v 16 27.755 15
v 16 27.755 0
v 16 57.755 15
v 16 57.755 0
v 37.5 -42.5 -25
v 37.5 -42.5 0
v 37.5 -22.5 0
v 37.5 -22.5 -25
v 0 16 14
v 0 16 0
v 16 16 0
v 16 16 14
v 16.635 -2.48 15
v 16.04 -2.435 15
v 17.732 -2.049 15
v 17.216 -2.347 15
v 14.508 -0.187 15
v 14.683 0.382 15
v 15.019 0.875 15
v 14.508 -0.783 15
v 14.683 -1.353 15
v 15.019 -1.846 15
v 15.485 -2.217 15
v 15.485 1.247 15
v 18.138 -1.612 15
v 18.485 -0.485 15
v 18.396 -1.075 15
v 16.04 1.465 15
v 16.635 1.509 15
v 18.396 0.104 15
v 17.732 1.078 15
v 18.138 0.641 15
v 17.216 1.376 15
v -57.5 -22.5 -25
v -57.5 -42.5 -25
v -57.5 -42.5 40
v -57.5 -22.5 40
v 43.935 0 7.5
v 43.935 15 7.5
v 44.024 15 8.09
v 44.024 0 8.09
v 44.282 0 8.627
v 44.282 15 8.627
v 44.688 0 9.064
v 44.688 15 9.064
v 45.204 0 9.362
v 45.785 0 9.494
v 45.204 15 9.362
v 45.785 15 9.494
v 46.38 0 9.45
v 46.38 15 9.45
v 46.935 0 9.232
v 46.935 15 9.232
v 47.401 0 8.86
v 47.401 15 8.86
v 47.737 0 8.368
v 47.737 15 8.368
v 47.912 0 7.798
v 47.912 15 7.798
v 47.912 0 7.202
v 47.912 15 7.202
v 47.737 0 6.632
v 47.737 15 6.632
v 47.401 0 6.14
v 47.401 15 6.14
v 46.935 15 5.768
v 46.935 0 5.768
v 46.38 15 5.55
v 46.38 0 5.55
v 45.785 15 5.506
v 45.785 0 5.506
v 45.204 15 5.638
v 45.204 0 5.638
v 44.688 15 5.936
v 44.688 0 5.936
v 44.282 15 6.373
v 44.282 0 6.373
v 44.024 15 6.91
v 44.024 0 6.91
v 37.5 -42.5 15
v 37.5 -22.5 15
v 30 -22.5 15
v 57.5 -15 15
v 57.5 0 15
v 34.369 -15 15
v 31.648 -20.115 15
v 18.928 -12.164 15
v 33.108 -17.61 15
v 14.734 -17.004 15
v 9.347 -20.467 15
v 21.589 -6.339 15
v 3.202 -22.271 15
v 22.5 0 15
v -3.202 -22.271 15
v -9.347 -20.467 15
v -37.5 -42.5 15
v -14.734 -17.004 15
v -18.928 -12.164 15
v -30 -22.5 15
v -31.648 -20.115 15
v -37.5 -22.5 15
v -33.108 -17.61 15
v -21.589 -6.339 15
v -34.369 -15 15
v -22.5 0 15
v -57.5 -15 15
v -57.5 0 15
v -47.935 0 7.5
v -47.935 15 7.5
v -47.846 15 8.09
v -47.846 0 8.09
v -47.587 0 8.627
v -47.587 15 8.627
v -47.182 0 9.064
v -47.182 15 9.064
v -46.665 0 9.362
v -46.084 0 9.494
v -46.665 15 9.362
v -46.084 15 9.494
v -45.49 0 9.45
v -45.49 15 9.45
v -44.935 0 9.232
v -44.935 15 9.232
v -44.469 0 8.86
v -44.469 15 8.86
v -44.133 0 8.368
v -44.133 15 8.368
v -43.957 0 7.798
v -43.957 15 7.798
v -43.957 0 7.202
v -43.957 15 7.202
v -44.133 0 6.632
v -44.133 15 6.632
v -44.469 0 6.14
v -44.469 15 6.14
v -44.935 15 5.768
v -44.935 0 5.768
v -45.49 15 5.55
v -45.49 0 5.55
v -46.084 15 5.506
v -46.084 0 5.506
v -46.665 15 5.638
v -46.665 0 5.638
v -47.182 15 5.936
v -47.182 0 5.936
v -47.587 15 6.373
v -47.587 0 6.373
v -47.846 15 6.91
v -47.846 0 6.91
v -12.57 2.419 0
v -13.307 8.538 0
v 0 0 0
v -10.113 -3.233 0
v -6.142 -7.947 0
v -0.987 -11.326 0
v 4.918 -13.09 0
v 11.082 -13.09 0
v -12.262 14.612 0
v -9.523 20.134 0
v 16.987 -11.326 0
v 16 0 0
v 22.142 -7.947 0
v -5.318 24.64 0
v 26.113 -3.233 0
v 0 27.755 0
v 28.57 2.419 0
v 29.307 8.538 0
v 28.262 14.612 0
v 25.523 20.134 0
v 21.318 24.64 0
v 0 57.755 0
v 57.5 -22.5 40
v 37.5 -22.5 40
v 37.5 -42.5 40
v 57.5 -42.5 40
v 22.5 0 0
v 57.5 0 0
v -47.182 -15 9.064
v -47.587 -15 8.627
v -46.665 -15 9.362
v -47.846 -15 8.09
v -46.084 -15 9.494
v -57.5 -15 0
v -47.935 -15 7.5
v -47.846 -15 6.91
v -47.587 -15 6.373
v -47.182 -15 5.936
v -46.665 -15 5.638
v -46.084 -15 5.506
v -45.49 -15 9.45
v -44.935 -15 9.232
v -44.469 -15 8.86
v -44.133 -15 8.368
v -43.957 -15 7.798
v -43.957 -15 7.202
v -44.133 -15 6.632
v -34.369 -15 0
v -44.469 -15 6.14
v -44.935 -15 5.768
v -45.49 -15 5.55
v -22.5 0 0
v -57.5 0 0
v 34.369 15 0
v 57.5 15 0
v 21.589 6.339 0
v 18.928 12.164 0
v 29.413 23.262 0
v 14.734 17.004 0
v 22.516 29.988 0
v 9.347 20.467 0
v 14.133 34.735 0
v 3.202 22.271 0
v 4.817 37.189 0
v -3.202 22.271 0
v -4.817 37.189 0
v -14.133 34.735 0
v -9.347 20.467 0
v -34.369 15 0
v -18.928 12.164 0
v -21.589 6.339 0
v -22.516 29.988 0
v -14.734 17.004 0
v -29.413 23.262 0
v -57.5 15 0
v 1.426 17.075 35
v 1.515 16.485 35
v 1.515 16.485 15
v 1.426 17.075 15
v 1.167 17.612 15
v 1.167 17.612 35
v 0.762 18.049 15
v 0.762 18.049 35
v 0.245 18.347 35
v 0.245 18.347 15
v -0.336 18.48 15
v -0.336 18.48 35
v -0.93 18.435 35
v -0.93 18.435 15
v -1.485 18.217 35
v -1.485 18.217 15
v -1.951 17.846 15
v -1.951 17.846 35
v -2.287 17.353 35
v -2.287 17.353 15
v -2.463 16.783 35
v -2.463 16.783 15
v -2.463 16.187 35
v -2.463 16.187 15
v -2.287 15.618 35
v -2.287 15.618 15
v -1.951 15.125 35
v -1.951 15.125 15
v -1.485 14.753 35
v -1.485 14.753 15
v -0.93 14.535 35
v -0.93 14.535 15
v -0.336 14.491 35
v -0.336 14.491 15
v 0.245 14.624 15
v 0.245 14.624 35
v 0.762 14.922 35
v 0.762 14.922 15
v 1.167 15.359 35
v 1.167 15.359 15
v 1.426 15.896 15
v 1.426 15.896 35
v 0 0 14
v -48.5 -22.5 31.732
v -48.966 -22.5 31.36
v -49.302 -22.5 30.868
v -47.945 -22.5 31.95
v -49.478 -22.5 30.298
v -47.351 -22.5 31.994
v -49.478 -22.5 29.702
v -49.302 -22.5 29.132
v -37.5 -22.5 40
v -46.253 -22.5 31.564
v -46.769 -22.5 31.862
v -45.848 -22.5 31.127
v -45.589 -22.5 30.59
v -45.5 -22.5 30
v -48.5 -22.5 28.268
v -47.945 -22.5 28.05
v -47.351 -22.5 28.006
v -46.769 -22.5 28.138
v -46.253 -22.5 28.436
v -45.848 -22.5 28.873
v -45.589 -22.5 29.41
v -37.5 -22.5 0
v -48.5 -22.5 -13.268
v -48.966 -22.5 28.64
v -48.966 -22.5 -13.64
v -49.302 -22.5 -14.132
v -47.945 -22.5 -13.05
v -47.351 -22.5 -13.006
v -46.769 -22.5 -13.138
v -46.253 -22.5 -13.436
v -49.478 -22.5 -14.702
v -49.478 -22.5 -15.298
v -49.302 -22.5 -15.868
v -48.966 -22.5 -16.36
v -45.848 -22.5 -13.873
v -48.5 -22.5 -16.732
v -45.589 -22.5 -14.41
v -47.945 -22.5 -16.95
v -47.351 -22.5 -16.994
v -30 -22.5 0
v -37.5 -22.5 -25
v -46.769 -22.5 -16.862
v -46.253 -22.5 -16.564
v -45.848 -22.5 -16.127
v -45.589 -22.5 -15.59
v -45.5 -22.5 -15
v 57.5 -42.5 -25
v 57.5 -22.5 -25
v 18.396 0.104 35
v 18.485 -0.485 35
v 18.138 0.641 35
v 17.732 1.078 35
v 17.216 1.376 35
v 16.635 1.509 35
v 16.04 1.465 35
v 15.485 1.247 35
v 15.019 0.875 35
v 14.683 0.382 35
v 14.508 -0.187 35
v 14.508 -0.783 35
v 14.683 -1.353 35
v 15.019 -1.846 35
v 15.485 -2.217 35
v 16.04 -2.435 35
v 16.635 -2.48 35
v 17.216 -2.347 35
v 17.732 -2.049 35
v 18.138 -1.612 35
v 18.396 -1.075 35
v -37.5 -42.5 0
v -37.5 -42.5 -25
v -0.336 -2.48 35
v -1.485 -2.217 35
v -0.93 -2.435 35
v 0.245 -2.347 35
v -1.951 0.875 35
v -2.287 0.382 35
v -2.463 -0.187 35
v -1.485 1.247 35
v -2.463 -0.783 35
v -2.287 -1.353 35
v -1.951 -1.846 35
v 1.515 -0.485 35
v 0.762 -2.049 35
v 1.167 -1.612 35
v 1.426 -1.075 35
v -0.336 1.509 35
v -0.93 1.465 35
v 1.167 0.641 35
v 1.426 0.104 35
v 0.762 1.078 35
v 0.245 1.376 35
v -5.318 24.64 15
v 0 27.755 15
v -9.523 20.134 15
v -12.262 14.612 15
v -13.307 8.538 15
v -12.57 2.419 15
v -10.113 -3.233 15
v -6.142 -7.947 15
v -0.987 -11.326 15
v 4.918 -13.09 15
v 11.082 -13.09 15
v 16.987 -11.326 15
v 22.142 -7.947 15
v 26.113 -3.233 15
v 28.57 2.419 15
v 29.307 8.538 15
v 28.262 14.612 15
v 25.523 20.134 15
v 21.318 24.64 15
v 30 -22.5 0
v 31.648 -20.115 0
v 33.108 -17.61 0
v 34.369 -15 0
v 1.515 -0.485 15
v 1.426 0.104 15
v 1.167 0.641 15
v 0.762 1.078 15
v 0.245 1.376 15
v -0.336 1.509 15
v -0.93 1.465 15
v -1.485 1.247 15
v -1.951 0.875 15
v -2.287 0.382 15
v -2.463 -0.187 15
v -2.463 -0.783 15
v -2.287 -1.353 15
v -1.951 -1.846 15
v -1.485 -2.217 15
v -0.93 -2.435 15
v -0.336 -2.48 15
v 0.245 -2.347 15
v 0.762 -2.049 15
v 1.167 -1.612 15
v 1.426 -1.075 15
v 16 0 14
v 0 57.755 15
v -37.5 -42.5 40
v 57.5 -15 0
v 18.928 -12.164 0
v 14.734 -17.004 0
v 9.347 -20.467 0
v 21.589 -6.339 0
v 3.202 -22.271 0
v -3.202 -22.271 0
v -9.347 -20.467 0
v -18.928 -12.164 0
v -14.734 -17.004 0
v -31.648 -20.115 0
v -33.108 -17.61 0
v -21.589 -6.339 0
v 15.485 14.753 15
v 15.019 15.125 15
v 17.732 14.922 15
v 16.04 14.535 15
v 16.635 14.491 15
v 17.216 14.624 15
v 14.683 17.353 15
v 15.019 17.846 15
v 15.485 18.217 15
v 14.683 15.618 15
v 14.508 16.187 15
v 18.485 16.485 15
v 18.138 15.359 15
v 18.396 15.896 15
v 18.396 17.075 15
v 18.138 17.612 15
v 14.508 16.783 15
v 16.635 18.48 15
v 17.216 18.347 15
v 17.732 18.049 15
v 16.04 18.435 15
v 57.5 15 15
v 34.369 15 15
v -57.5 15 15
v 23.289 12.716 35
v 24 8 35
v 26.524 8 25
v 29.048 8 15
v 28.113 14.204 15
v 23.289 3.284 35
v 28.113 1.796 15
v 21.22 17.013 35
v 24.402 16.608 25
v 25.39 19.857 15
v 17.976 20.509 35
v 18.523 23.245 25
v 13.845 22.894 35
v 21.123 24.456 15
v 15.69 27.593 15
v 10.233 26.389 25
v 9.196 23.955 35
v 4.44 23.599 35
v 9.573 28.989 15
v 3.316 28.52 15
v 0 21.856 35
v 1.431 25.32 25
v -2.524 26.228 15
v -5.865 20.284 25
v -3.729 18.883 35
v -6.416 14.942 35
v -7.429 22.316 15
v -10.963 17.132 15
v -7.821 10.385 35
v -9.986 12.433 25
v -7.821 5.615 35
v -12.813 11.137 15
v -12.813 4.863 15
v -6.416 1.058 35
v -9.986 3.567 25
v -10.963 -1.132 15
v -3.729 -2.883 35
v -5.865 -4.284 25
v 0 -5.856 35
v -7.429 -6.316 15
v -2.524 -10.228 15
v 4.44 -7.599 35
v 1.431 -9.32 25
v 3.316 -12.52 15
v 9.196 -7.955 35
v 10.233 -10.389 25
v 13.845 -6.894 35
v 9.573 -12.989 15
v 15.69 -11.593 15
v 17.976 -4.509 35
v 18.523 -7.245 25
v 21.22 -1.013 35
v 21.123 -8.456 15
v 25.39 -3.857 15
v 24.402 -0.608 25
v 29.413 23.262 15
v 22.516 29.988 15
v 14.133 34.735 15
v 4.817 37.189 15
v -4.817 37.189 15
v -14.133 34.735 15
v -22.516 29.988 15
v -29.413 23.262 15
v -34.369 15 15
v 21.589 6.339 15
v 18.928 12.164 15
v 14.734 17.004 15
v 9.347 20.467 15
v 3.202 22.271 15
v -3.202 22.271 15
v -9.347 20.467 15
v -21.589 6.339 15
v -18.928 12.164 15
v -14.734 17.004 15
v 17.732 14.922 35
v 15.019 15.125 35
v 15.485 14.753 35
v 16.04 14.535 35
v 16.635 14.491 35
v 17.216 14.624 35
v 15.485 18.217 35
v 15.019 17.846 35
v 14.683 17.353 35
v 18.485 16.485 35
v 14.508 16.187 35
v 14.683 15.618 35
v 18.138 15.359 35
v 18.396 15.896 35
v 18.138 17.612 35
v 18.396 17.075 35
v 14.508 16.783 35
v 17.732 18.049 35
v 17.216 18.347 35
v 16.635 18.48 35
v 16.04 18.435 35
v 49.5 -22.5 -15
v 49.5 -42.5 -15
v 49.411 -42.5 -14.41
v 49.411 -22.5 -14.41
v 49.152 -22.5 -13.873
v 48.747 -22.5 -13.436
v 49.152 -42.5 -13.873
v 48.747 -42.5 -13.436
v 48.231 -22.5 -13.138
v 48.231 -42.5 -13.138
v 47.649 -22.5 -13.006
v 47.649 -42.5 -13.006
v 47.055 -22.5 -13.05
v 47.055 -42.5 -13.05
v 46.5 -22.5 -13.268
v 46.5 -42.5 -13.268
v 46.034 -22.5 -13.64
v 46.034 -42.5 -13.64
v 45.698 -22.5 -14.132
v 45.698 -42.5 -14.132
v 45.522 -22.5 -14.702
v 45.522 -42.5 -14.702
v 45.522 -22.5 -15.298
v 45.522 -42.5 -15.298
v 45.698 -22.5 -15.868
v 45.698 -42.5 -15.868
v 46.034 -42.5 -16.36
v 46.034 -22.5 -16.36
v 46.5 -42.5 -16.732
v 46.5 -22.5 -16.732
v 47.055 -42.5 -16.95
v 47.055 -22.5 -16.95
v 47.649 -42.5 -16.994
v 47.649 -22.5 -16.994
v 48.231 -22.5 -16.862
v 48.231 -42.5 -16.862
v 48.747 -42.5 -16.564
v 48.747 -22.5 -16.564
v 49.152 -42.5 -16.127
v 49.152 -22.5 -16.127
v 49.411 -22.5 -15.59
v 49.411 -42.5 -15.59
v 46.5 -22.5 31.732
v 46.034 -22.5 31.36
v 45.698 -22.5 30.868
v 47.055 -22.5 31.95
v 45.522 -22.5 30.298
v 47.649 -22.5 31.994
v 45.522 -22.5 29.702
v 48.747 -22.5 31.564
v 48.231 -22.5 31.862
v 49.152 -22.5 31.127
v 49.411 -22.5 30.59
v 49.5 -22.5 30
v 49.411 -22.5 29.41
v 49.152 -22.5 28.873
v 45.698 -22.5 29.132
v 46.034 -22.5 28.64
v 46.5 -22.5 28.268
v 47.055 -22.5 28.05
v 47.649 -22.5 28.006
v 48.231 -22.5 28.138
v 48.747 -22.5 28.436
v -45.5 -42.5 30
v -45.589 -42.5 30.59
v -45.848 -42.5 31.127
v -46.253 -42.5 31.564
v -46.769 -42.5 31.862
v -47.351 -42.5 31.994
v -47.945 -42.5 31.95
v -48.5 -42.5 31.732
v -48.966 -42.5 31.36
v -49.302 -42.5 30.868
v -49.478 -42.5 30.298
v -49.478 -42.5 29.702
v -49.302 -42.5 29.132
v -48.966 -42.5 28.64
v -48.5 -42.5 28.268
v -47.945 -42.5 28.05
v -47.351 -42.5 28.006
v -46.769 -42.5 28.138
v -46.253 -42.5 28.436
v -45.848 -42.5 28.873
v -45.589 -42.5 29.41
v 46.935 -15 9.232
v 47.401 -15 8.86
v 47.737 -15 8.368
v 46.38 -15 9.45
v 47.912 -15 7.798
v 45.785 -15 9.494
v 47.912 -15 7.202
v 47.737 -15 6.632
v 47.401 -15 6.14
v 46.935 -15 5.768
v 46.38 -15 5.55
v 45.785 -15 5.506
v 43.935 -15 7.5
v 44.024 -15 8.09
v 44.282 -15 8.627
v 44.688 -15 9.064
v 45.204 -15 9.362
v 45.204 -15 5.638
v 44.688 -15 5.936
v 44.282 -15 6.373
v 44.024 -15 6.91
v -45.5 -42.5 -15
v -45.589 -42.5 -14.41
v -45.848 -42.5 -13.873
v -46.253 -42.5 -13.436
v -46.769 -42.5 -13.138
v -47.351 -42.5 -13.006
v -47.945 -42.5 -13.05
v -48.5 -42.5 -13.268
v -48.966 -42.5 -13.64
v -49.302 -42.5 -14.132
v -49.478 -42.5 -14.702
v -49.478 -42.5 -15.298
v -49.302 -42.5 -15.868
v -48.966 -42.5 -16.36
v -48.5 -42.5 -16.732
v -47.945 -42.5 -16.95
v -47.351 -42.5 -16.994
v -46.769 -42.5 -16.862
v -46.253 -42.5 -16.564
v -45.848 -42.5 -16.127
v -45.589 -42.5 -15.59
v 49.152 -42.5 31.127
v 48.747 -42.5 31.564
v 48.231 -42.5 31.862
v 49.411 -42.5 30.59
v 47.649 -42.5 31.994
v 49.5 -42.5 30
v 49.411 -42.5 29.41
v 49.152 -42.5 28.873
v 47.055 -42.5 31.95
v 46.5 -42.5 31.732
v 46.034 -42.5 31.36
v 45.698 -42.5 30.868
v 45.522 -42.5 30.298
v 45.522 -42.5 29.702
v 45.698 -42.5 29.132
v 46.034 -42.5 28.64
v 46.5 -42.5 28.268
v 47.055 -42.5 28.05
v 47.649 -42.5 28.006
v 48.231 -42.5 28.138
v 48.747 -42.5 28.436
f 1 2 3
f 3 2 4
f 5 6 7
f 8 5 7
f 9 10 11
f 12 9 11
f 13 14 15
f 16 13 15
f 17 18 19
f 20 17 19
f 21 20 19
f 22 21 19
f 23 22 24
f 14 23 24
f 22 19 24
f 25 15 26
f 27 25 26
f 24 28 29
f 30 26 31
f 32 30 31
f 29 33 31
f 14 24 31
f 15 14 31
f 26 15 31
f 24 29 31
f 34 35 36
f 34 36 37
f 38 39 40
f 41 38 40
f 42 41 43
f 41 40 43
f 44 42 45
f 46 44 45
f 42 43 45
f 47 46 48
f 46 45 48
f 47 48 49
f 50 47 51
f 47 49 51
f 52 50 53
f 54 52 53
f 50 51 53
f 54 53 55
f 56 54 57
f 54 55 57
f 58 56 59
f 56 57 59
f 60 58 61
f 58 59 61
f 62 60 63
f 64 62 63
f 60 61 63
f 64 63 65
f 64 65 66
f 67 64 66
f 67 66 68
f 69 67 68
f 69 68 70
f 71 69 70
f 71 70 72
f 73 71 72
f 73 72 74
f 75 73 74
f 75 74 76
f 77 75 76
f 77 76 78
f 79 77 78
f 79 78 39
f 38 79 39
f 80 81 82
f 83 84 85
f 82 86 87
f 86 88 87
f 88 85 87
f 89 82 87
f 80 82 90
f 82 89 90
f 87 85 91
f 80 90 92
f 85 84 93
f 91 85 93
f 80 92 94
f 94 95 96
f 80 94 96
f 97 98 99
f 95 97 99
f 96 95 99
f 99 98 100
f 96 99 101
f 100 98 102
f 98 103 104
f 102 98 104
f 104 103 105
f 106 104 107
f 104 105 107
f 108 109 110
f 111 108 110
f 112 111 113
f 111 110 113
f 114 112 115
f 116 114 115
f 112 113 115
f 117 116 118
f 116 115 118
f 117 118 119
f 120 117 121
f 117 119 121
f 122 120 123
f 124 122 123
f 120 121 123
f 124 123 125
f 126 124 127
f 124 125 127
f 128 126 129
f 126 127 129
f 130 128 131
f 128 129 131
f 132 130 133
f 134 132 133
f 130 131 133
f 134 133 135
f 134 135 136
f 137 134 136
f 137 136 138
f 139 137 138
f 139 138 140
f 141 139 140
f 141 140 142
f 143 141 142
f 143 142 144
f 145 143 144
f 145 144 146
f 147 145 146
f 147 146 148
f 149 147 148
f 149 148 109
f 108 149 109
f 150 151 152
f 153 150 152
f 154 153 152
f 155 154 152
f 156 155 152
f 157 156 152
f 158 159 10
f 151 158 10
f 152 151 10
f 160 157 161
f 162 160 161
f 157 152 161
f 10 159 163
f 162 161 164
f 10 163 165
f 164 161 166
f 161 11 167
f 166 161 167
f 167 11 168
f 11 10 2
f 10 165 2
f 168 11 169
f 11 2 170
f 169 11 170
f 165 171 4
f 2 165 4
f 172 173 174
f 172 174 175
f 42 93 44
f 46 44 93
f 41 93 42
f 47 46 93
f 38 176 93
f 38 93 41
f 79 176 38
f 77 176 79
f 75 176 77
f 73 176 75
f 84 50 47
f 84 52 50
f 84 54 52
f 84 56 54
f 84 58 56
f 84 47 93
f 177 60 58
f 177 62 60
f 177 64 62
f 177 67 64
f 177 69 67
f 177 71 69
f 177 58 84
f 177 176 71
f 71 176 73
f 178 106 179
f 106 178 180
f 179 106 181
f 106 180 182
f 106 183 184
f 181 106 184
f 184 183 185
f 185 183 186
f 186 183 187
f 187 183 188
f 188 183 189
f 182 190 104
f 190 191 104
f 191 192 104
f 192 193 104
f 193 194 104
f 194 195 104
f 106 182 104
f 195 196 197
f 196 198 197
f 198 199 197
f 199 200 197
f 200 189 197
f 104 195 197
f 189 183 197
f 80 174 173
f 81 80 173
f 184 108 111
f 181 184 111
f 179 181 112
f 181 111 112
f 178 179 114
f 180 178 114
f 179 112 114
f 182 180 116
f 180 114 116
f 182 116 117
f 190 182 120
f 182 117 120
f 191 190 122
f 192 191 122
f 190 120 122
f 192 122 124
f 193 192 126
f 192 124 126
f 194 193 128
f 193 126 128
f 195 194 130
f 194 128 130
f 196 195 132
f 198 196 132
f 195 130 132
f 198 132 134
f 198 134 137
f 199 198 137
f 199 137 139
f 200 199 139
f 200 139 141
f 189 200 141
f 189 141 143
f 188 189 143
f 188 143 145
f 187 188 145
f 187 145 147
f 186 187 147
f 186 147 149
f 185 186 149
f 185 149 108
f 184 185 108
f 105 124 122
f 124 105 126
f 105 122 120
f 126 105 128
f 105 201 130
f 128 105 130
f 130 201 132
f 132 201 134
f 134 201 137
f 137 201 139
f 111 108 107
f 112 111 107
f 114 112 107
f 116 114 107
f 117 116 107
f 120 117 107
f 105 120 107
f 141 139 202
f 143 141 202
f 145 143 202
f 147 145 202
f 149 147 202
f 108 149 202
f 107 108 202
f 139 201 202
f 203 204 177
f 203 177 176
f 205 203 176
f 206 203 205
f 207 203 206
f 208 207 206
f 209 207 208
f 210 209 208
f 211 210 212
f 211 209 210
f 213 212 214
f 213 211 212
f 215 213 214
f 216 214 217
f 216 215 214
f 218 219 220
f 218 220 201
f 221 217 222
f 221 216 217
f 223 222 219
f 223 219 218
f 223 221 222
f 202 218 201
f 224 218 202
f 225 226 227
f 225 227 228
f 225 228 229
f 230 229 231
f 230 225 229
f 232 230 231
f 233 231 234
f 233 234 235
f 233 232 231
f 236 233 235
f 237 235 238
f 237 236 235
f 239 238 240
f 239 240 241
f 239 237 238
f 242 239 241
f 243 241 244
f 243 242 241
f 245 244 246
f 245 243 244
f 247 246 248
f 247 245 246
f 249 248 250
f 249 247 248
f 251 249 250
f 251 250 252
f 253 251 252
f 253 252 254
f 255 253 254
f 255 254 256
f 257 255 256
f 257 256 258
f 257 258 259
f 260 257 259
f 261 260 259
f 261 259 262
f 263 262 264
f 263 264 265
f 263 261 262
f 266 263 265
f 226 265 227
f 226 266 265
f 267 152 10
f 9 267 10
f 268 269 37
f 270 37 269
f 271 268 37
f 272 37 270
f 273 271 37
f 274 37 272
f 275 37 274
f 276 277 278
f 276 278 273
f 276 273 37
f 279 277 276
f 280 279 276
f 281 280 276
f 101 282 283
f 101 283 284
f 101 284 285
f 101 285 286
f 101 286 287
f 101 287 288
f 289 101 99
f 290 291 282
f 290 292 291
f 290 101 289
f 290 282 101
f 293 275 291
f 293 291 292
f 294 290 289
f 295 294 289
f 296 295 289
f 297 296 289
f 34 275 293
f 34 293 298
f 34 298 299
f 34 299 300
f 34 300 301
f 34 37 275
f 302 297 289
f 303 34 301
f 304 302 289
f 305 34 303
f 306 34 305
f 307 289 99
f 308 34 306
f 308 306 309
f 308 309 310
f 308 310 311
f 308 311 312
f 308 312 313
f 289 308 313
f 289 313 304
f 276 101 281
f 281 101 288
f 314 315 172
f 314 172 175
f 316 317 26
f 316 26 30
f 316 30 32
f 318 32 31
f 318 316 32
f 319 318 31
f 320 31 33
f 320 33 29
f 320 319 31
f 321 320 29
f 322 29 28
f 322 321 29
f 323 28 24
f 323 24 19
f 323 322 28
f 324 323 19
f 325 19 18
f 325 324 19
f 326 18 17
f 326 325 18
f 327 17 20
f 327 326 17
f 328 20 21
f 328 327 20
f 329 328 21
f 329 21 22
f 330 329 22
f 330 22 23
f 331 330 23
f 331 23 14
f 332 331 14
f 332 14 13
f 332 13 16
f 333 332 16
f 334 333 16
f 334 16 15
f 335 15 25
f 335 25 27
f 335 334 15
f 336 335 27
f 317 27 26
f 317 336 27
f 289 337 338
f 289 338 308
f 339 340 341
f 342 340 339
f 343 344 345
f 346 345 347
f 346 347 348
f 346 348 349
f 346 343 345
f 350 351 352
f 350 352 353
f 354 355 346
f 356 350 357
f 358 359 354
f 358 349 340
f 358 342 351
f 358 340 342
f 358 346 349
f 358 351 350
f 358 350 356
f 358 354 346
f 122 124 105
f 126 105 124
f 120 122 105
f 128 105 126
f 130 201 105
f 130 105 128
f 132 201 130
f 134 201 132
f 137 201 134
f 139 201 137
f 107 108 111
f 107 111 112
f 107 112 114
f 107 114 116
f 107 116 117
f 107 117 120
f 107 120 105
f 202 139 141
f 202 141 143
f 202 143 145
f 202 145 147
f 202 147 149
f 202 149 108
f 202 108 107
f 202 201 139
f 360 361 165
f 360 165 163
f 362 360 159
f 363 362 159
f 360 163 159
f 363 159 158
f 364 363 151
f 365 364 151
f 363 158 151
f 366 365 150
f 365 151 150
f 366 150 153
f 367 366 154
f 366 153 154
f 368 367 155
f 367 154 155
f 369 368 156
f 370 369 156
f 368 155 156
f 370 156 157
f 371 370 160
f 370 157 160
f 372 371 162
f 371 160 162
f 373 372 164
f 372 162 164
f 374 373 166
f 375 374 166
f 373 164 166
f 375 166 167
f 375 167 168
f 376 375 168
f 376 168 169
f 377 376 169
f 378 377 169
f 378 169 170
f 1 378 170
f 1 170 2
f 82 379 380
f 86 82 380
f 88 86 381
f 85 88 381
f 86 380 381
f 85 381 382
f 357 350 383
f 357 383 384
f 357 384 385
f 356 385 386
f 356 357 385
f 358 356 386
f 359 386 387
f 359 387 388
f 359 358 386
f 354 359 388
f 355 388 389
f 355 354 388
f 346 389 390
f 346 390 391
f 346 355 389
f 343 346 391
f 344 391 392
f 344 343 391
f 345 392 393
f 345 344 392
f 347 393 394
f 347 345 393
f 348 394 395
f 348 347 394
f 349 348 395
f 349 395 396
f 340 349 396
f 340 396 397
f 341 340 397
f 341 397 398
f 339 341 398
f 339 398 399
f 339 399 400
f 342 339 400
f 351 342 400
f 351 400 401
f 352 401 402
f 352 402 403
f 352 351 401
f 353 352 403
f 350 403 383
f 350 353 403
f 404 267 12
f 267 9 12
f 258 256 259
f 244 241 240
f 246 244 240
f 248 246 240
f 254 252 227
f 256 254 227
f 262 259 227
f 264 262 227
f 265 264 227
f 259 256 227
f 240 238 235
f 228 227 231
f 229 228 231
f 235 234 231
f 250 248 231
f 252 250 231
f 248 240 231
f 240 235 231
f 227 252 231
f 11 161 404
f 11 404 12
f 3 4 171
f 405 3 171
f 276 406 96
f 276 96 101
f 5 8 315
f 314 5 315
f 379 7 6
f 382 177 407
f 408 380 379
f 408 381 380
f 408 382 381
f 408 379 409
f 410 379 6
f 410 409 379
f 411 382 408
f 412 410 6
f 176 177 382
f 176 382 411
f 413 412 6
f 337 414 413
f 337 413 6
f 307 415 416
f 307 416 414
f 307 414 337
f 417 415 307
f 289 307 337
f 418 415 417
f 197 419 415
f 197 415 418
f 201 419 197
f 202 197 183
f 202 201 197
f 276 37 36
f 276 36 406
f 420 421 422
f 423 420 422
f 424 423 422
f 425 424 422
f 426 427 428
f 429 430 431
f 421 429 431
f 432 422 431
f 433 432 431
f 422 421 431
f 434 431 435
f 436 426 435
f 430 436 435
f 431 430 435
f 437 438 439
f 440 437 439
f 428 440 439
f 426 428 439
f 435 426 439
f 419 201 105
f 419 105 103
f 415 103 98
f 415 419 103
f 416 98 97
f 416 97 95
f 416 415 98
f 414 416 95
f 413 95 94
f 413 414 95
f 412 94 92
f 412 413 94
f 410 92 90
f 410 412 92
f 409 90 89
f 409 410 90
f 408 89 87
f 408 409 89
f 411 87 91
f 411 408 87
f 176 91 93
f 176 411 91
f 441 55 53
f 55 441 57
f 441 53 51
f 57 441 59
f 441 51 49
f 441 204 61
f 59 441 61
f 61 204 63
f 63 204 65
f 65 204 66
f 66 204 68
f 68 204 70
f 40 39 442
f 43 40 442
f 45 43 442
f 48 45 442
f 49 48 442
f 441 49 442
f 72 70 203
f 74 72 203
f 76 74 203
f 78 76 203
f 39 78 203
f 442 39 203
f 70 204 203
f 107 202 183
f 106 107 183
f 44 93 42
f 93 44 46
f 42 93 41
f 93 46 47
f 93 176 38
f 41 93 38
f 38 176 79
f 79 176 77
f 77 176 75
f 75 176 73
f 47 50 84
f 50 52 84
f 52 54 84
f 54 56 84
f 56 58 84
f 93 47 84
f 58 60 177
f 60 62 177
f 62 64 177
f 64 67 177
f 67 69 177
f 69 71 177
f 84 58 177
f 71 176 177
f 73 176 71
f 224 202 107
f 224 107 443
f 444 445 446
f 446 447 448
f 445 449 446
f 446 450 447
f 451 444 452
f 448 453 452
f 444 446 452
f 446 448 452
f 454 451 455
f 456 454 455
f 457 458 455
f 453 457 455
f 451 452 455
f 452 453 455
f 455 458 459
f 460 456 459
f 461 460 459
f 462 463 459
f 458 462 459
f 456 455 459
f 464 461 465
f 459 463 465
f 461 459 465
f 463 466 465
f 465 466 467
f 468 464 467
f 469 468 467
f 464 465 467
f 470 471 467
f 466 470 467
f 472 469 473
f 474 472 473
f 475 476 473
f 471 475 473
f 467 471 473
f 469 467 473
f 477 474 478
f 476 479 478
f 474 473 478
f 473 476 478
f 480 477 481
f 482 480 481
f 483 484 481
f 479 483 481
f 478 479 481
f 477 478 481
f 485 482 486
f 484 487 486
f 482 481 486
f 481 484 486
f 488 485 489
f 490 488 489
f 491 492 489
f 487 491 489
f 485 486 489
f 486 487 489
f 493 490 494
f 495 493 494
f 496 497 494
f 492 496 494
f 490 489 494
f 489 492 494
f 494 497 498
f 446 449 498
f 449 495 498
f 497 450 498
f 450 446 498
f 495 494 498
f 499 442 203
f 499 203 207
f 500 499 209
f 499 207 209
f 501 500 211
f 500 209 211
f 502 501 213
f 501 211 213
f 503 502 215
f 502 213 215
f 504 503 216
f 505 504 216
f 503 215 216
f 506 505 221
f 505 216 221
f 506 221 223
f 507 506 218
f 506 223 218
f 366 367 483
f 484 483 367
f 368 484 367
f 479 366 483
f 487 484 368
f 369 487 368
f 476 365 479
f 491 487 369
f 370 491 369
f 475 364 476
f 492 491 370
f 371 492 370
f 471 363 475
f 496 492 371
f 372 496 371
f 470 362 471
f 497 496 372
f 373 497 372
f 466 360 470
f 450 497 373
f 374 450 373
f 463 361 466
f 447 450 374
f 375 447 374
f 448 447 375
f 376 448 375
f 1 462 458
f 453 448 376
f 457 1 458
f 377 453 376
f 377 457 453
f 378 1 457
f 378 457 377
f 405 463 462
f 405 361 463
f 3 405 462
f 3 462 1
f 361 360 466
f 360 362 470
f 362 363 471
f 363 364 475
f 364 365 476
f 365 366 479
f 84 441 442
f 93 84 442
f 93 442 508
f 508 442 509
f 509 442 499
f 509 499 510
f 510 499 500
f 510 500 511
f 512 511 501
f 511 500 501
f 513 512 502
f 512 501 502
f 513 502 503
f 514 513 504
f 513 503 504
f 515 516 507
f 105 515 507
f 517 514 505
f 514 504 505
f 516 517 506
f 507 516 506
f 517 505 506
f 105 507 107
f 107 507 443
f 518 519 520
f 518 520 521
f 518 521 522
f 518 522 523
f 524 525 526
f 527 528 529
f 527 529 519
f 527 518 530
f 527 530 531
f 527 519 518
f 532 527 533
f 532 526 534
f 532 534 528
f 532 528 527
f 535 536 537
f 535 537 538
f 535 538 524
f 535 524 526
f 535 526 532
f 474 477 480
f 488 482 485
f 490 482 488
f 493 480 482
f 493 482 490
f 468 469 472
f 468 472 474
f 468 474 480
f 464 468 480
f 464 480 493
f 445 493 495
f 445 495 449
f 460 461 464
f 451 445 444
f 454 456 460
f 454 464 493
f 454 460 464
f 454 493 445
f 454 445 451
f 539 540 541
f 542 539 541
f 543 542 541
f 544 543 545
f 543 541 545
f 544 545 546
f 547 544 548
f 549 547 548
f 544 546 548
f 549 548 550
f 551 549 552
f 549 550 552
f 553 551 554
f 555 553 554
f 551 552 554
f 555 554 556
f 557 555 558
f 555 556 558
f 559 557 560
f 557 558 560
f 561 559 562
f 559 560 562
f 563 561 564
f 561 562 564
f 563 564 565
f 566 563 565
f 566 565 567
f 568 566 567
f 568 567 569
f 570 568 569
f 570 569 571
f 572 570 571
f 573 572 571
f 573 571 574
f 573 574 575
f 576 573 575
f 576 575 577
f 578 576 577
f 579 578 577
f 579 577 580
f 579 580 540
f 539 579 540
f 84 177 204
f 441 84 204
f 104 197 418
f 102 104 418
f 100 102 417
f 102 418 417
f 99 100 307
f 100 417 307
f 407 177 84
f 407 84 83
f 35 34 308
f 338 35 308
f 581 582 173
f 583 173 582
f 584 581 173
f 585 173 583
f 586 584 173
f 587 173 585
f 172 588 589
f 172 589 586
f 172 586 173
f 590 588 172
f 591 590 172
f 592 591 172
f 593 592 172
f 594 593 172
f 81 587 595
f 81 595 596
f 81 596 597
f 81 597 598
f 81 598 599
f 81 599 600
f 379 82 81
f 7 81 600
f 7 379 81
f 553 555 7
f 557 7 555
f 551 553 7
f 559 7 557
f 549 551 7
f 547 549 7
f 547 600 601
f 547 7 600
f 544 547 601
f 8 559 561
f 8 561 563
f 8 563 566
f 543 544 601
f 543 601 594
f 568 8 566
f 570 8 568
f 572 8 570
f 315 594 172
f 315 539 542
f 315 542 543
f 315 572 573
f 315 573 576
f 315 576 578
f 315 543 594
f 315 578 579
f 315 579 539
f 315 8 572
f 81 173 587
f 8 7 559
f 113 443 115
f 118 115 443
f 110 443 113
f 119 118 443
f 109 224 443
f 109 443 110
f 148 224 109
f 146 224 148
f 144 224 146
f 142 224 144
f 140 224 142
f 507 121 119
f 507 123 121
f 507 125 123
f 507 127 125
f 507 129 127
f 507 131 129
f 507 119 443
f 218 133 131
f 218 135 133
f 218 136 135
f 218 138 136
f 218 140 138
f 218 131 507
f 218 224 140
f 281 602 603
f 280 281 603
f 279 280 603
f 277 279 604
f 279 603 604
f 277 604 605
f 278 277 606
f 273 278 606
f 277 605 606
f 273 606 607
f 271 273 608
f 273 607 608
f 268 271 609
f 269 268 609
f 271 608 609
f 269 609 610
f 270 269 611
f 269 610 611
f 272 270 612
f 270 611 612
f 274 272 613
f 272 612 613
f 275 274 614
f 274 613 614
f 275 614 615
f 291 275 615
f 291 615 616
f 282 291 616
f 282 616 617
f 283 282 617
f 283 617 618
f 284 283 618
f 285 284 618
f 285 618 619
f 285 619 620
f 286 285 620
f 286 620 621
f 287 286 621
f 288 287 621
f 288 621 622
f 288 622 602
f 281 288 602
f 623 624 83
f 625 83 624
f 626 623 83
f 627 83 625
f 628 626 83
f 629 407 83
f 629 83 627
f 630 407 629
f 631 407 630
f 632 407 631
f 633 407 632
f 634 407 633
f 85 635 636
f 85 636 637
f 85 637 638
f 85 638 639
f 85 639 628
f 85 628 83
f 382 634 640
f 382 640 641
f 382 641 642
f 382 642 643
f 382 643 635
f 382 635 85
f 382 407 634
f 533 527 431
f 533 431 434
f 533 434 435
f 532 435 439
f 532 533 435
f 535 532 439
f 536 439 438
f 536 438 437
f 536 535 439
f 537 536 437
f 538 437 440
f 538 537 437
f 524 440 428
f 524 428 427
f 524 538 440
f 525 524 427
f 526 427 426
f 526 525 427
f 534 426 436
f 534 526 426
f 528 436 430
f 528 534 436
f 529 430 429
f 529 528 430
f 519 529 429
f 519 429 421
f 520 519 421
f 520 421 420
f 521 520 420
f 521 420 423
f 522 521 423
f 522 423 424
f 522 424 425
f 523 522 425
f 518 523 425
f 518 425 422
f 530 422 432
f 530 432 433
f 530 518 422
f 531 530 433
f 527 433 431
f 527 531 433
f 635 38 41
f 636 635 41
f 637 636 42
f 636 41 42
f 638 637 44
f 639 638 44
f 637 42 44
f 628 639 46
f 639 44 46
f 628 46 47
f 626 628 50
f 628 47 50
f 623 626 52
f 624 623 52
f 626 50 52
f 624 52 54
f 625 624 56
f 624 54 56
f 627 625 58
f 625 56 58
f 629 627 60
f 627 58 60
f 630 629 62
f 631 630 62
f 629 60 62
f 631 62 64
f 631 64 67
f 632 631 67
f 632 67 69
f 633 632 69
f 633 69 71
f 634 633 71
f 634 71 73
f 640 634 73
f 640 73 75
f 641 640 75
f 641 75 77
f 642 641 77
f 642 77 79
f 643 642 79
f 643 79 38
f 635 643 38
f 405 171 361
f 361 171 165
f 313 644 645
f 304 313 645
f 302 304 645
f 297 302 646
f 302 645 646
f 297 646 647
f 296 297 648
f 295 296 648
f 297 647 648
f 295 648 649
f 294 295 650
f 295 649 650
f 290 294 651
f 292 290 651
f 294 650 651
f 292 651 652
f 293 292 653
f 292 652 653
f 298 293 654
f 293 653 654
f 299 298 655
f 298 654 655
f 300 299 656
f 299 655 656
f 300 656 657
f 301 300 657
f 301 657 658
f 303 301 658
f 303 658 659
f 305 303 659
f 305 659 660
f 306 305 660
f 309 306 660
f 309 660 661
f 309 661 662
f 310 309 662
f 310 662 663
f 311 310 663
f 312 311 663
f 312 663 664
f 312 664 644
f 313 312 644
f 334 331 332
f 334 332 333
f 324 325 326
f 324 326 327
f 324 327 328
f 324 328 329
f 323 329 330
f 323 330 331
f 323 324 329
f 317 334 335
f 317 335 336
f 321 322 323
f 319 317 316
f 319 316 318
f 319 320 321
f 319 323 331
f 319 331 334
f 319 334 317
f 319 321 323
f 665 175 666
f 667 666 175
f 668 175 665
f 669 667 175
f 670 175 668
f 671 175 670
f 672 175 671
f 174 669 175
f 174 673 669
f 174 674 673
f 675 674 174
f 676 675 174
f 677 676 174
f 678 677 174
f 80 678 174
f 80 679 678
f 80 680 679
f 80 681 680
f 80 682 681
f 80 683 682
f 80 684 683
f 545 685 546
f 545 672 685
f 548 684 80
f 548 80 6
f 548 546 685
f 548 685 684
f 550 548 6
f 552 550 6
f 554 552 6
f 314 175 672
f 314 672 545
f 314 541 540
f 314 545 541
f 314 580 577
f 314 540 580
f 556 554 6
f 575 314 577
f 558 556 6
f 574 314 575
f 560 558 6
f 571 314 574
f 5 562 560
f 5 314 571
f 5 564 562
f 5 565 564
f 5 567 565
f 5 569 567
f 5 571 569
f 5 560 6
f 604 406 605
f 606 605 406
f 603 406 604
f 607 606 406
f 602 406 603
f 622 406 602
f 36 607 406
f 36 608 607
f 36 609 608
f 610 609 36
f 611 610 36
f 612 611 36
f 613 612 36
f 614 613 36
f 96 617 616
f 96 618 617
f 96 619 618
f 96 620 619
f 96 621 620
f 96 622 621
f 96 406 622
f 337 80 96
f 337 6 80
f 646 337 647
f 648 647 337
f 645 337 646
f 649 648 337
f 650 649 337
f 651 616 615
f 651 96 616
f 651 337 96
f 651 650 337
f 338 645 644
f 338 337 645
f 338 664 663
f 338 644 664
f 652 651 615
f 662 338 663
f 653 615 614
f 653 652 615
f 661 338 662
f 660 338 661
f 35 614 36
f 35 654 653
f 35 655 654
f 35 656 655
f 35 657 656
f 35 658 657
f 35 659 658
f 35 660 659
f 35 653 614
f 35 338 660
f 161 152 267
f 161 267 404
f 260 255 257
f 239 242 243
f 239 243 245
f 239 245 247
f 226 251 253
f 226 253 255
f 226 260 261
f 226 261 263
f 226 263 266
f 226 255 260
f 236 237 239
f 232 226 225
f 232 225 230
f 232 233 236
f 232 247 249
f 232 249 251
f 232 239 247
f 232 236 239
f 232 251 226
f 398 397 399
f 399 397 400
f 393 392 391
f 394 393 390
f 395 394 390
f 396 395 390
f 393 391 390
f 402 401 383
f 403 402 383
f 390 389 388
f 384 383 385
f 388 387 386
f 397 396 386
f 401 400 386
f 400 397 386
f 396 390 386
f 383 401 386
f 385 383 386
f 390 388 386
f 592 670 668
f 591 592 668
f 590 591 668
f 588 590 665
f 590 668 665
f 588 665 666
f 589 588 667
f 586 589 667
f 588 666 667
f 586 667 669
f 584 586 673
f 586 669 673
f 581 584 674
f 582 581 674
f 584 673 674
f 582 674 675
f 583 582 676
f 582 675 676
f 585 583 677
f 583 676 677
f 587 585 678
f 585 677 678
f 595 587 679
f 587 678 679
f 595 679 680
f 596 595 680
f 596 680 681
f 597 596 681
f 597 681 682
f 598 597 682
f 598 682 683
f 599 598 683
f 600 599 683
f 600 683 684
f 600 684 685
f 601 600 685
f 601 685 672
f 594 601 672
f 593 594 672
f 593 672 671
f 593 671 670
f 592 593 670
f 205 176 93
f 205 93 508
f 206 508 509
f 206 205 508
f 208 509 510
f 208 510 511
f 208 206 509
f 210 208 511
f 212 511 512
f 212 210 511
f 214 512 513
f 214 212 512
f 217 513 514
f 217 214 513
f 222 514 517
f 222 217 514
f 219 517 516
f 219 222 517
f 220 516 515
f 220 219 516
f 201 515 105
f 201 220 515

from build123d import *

# Parameters (mm, degrees)
SKETCH004_R           = 2
EXTRUDE004_DEPTH      = 30
EXTRUDE_DEPTH         = 15
EXTRUDE005_DEPTH      = 30
EXTRUDE001_DEPTH      = 15
SKETCH003_R           = 2
EXTRUDE003_DEPTH      = 30
SKETCH002_W           = 20
SKETCH002_H           = 20
EXTRUDE002_DEPTH      = 25
EXTRUDE002_DEPTH_BACK = 40
SKETCH008_R           = 2
EXTRUDE007_DEPTH      = 20
SKETCH005_W           = 16
SKETCH005_H           = 16
EXTRUDE006_DEPTH      = 15
SKETCH006_R           = 16
SKETCH007_R           = 21.3


with BuildPart() as connectscrewstop:
    # Sketch004 (on Face6 of Extrude) → Extrude004 (new body)
    with BuildSketch(Plane(origin=(0, 15, 0), x_dir=(-1, 0, 0), z_dir=(0, 1, 0))):
        with Locations((-45.934659, 7.5)):
            Circle(SKETCH004_R)
        with Locations((45.934659, 7.5)):
            Circle(SKETCH004_R)
    extrude(amount=-EXTRUDE004_DEPTH)


with BuildPart() as top:
    # Sketch → Extrude (new body)
    with BuildSketch(Plane.XY):
        with BuildLine():
            ThreePointArc((22.5, 0), (0, 22.5), (-22.5, 0))
            Line((-22.5, 0), (-57.5, 0))
            Line((-57.5, 0), (-57.5, 15))
            Line((-57.5, 15), (-34.369318, 15))
            ThreePointArc((34.369318, 15), (0, 37.5), (-34.369318, 15))
            Line((57.5, 15), (34.369318, 15))
            Line((57.5, 0), (57.5, 15))
            Line((22.5, 0), (57.5, 0))
        make_face()
    extrude(amount=EXTRUDE_DEPTH)

    # Cut001: cut ConnectScrewsTop
    add(connectscrewstop.part, mode=Mode.SUBTRACT)


with BuildPart() as connectscrewsbottom:
    # Sketch004 (on Face6 of Extrude) → Extrude005 (new body)
    with BuildSketch(Plane(origin=(0, 15, 0), x_dir=(-1, 0, 0), z_dir=(0, 1, 0))):
        with Locations((-45.934659, 7.5)):
            Circle(SKETCH004_R)
        with Locations((45.934659, 7.5)):
            Circle(SKETCH004_R)
    extrude(amount=-EXTRUDE005_DEPTH)


with BuildPart() as bottom:
    # Sketch001 (on Sketch) → Extrude001 (new body)
    with BuildSketch(Plane.XY):
        with BuildLine():
            ThreePointArc((-22.5, 0), (0, -22.5), (22.5, 0))
            Line((22.5, 0), (57.5, 0))
            Line((57.5, 0), (57.5, -15))
            Line((57.5, -15), (34.369318, -15))
            ThreePointArc((30, -22.5), (32.402388, -18.876844), (34.369318, -15))
            Line((30, -22.5), (57.5, -22.5))
            Line((57.5, -22.5), (57.5, -42.5))
            Line((57.5, -42.5), (-57.5, -42.5))
            Line((-57.5, -42.5), (-57.5, -22.5))
            Line((-57.5, -22.5), (-30, -22.5))
            ThreePointArc((-34.369318, -15), (-32.402388, -18.876844), (-30, -22.5))
            Line((-57.5, -15), (-34.369318, -15))
            Line((-57.5, 0), (-57.5, -15))
            Line((-22.5, 0), (-57.5, 0))
        make_face()
    extrude(amount=EXTRUDE001_DEPTH)

    # Cut002: cut ConnectScrewsBottom
    add(connectscrewsbottom.part, mode=Mode.SUBTRACT)


with BuildPart() as basescrews:
    # Sketch003 (on Face4 of Extrude002) → Extrude003 (new body)
    with BuildSketch(Plane.XZ.offset(42.5)):
        with Locations((-47.5, 30)):
            Circle(SKETCH003_R)
        with Locations((-47.5, -15)):
            Circle(SKETCH003_R)
        with Locations((47.5, 30)):
            Circle(SKETCH003_R)
        with Locations((47.5, -15)):
            Circle(SKETCH003_R)
    extrude(amount=-EXTRUDE003_DEPTH)


with BuildPart() as bottomhalf:
    # Sketch002 (on Face16 of Extrude001) → Extrude002 (new body, two sides)
    with BuildSketch(Plane.XY.offset(15)) as extrude002_sk:
        with Locations((47.5, -32.5)):
            Rectangle(SKETCH002_W, SKETCH002_H)
        with Locations((-47.5, -32.5)):
            Rectangle(SKETCH002_W, SKETCH002_H)
    extrude(amount=EXTRUDE002_DEPTH)
    extrude(extrude002_sk.sketch, amount=-EXTRUDE002_DEPTH_BACK)

    # Cut: cut BaseScrews
    add(basescrews.part, mode=Mode.SUBTRACT)

    # Fusion: union Bottom
    add(bottom.part)


with BuildPart() as screwholes:
    # Sketch008 (on Face2 of Loft) → Extrude007 (new body)
    with BuildSketch(Plane.XY.offset(35)):
        with Locations((16.485281, 16.485281)):
            Circle(SKETCH008_R)
        with Locations((-0.485281, 16.485281)):
            Circle(SKETCH008_R)
        with Locations((-0.485281, -0.485281)):
            Circle(SKETCH008_R)
        with Locations((16.485281, -0.485281)):
            Circle(SKETCH008_R)
    extrude(amount=-EXTRUDE007_DEPTH)


with BuildPart() as socket:
    # Sketch005 → Extrude006 (new body)
    with BuildSketch(Plane.XY):
        with BuildLine():
            ThreePointArc((0, 27.755358), (8, -13.313708), (16, 27.755358))
            Line((16, 27.755358), (16, 57.755358))
            Line((16, 57.755358), (0, 57.755358))
            Line((0, 57.755358), (0, 27.755358))
        make_face()
        with Locations((8, 8)):
            Rectangle(SKETCH005_W, SKETCH005_H, mode=Mode.SUBTRACT)
    extrude(amount=EXTRUDE006_DEPTH)


with BuildPart() as fusion001:
    # Sketch006 (on Face10 of Extrude006) → Loft section 0
    with BuildSketch(Plane.XY.offset(35)):
        with Locations((8, 8)):
            Circle(SKETCH006_R)
    # Sketch007 (on Face10 of Extrude006) → Loft section 1
    with BuildSketch(Plane.XY.offset(14)):
        with Locations((8, 8)):
            Circle(SKETCH007_R)
    loft()

    # Fusion001: union Socket
    add(socket.part)


solid = Compound([top.part, bottomhalf.part, screwholes.part, fusion001.part])
